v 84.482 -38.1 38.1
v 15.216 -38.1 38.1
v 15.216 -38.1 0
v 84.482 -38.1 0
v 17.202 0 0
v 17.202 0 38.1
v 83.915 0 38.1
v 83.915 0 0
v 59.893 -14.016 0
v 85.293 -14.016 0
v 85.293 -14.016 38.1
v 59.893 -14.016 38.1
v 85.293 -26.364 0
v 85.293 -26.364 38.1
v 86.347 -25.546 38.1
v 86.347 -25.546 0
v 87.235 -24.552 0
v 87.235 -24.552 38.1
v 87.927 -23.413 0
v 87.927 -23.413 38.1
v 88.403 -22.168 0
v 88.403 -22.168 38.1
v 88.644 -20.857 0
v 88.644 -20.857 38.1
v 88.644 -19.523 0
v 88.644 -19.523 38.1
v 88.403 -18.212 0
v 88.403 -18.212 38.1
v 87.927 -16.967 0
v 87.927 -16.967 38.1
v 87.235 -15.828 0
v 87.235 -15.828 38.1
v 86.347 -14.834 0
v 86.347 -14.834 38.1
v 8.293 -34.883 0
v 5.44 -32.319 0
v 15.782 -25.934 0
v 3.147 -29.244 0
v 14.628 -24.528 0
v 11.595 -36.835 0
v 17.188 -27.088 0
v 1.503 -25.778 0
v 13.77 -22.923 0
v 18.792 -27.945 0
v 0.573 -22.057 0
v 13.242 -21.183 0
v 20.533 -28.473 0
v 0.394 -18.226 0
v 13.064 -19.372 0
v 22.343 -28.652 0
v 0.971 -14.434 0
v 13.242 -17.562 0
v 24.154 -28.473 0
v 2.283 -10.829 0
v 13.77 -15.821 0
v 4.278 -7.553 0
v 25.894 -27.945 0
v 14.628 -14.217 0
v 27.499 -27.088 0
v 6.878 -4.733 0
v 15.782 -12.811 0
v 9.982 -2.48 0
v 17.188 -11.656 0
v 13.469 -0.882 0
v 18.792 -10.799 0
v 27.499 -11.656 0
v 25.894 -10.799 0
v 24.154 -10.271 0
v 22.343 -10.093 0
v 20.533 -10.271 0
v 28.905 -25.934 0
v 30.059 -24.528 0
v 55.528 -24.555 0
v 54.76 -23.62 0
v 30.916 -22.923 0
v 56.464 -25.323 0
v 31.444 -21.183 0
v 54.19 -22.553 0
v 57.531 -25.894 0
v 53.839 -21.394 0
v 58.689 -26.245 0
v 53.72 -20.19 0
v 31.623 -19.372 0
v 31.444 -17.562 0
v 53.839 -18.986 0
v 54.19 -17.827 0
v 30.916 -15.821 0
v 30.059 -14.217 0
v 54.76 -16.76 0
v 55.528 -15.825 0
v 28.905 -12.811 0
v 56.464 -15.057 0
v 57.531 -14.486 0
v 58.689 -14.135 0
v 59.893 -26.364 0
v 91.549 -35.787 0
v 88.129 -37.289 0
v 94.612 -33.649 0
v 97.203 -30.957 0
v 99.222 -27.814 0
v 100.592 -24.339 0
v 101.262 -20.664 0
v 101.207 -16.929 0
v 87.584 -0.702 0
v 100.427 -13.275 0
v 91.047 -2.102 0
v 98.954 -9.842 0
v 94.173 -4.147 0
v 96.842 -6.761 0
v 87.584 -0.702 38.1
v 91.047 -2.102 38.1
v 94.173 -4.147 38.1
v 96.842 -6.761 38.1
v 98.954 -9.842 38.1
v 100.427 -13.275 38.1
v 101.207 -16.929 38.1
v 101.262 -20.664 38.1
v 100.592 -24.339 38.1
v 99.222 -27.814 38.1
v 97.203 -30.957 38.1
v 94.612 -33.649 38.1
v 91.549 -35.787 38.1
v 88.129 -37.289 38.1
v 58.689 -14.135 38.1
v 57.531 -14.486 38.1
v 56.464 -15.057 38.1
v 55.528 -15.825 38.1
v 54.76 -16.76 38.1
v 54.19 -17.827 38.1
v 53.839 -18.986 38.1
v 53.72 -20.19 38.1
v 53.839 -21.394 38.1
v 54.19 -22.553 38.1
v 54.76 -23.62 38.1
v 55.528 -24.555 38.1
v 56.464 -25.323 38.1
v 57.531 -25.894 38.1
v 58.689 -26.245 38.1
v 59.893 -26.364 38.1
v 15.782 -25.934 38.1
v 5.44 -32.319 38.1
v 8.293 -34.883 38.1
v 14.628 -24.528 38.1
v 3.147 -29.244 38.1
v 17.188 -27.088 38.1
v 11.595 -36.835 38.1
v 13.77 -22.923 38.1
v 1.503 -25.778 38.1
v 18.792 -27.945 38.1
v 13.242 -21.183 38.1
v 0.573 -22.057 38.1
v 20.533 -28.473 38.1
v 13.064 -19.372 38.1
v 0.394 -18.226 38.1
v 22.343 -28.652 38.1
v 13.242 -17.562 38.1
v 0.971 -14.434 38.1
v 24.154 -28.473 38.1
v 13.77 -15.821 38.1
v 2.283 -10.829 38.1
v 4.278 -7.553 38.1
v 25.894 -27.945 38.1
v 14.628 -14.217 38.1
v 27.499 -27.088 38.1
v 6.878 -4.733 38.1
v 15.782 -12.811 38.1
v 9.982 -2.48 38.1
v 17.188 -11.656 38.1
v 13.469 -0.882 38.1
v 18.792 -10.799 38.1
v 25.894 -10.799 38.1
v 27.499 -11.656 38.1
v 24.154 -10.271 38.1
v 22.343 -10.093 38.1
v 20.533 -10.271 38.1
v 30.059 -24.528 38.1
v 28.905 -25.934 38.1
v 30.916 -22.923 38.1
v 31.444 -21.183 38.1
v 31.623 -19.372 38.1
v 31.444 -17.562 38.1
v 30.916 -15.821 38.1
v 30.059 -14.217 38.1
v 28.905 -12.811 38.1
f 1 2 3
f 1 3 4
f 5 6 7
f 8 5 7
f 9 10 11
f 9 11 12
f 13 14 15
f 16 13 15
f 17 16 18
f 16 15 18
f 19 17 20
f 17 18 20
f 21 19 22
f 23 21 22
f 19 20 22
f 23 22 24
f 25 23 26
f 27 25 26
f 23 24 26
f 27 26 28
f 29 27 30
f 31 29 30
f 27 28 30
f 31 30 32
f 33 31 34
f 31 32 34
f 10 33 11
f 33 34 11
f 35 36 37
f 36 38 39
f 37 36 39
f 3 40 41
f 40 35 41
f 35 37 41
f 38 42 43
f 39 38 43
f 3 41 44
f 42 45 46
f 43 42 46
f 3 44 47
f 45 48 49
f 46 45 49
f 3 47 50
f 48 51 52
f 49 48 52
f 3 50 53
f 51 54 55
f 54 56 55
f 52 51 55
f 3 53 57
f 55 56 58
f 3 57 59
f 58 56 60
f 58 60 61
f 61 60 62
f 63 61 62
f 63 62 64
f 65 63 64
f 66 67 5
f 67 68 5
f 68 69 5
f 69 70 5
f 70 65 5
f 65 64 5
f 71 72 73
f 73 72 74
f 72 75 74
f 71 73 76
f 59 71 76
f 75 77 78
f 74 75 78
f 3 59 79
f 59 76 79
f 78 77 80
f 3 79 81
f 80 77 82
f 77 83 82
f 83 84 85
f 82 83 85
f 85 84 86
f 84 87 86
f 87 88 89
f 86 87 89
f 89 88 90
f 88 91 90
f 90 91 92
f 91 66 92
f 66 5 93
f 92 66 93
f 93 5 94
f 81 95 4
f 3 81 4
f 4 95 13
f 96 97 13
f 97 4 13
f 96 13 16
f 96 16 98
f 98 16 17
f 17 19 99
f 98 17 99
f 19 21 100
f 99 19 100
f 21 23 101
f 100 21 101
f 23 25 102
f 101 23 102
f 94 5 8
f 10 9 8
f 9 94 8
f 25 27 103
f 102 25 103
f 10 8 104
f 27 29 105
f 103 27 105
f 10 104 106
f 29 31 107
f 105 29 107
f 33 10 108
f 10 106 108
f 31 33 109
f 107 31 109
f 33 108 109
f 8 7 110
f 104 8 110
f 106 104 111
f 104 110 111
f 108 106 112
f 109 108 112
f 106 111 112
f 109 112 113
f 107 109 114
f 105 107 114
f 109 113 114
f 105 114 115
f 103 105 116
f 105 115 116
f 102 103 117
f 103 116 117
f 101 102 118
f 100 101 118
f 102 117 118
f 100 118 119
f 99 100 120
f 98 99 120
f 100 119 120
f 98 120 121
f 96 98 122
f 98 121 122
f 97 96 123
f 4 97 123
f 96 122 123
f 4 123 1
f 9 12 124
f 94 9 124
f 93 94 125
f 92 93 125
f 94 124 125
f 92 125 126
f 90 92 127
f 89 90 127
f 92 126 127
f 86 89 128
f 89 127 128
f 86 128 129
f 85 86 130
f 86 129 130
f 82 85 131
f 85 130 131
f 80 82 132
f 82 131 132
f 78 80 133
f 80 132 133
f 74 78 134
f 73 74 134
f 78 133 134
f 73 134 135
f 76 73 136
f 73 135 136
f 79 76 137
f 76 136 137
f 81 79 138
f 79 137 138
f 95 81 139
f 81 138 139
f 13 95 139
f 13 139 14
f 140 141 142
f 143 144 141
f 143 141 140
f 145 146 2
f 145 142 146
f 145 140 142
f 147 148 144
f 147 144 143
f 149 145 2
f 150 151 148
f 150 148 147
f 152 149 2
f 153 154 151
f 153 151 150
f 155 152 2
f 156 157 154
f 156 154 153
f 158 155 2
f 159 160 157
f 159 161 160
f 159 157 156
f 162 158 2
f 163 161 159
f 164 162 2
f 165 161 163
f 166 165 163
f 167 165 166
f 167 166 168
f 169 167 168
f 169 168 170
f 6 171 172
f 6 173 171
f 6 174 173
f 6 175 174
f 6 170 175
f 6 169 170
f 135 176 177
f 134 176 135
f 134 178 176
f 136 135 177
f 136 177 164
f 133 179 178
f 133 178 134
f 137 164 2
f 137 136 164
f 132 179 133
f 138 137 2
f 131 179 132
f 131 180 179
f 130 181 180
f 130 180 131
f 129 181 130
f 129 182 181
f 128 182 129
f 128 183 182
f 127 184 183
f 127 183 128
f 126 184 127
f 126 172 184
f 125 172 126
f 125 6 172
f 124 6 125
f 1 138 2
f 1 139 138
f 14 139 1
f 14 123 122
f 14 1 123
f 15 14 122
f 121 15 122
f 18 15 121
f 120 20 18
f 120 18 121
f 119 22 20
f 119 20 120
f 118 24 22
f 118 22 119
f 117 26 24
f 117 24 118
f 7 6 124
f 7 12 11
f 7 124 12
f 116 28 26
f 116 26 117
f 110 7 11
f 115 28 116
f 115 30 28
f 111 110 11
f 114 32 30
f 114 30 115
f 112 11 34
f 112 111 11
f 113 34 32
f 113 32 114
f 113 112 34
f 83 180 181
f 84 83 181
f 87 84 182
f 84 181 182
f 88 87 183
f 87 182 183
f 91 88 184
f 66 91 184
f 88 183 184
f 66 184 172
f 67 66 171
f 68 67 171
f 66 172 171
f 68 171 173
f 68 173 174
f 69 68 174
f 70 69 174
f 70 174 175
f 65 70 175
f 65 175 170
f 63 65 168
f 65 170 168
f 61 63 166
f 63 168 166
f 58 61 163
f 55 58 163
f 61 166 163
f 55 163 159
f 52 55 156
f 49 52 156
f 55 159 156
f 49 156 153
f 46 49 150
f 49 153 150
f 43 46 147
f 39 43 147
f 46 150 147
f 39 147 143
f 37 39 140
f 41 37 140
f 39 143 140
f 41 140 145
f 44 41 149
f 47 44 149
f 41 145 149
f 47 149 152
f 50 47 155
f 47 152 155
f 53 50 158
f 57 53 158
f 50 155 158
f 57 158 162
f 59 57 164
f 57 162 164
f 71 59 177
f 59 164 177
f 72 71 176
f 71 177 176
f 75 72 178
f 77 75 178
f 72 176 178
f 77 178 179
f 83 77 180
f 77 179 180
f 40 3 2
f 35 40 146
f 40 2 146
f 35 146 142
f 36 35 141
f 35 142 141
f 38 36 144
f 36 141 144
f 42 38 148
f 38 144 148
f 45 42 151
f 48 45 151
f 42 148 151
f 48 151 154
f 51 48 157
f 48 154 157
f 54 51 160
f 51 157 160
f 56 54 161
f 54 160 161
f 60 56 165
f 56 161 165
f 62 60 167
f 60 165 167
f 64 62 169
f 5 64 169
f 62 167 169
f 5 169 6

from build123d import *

# Parameters (mm, degrees)
F0_W     = 101.6
F0_H     = 38.1
F1_DEPTH = 38.1
F3_DEPTH = 38.1
F4_R     = 9.279541
F5_DEPTH = 38.1
F7_DEPTH = 101.6


with BuildPart() as f1:
    # F0 (on Front) → F1 (new body)
    with BuildSketch(Plane.XZ):
        with Locations((50.8, 19.05)):
            Rectangle(F0_W, F0_H)
    extrude(amount=F1_DEPTH)

    # F2 (on face) → F3 (cut)
    with BuildSketch(Plane.XY.offset(38.1)):
        with BuildLine():
            ThreePointArc((83.914571, 0), (101.325868, -18.794907), (84.482022, -38.1))
            Line((84.482022, -38.1), (101.6, -38.1))
            Line((101.6, -38.1), (101.6, 0))
            Line((101.6, 0), (83.914571, 0))
        make_face()
        with BuildLine():
            Line((0, -38.1), (15.216109, -38.1))
            ThreePointArc((15.216109, -38.1), (0.393633, -18.225575), (17.202171, 0))
            Line((17.202171, 0), (0, 0))
            Line((0, 0), (0, -38.1))
        make_face()
    extrude(amount=-F3_DEPTH, mode=Mode.SUBTRACT)

    # F4 (on face) → F5 (cut)
    with BuildSketch(Plane.XY.offset(38.1)):
        with Locations((22.343248, -19.372153)):
            Circle(F4_R)
    extrude(amount=-F5_DEPTH, mode=Mode.SUBTRACT)

    # F6 (on face) → F7 (cut)
    with BuildSketch(Plane.XY.offset(38.1)):
        with BuildLine():
            Line((85.293495, -14.016386), (59.893495, -14.016386))
            ThreePointArc((59.893495, -14.016386), (53.719888, -20.189993), (59.893495, -26.363599))
            Line((59.893495, -26.363599), (85.293495, -26.363599))
            ThreePointArc((85.293495, -26.363599), (88.674518, -20.189993), (85.293495, -14.016386))
        make_face()
    extrude(amount=-F7_DEPTH, mode=Mode.SUBTRACT)


solid = f1.part
